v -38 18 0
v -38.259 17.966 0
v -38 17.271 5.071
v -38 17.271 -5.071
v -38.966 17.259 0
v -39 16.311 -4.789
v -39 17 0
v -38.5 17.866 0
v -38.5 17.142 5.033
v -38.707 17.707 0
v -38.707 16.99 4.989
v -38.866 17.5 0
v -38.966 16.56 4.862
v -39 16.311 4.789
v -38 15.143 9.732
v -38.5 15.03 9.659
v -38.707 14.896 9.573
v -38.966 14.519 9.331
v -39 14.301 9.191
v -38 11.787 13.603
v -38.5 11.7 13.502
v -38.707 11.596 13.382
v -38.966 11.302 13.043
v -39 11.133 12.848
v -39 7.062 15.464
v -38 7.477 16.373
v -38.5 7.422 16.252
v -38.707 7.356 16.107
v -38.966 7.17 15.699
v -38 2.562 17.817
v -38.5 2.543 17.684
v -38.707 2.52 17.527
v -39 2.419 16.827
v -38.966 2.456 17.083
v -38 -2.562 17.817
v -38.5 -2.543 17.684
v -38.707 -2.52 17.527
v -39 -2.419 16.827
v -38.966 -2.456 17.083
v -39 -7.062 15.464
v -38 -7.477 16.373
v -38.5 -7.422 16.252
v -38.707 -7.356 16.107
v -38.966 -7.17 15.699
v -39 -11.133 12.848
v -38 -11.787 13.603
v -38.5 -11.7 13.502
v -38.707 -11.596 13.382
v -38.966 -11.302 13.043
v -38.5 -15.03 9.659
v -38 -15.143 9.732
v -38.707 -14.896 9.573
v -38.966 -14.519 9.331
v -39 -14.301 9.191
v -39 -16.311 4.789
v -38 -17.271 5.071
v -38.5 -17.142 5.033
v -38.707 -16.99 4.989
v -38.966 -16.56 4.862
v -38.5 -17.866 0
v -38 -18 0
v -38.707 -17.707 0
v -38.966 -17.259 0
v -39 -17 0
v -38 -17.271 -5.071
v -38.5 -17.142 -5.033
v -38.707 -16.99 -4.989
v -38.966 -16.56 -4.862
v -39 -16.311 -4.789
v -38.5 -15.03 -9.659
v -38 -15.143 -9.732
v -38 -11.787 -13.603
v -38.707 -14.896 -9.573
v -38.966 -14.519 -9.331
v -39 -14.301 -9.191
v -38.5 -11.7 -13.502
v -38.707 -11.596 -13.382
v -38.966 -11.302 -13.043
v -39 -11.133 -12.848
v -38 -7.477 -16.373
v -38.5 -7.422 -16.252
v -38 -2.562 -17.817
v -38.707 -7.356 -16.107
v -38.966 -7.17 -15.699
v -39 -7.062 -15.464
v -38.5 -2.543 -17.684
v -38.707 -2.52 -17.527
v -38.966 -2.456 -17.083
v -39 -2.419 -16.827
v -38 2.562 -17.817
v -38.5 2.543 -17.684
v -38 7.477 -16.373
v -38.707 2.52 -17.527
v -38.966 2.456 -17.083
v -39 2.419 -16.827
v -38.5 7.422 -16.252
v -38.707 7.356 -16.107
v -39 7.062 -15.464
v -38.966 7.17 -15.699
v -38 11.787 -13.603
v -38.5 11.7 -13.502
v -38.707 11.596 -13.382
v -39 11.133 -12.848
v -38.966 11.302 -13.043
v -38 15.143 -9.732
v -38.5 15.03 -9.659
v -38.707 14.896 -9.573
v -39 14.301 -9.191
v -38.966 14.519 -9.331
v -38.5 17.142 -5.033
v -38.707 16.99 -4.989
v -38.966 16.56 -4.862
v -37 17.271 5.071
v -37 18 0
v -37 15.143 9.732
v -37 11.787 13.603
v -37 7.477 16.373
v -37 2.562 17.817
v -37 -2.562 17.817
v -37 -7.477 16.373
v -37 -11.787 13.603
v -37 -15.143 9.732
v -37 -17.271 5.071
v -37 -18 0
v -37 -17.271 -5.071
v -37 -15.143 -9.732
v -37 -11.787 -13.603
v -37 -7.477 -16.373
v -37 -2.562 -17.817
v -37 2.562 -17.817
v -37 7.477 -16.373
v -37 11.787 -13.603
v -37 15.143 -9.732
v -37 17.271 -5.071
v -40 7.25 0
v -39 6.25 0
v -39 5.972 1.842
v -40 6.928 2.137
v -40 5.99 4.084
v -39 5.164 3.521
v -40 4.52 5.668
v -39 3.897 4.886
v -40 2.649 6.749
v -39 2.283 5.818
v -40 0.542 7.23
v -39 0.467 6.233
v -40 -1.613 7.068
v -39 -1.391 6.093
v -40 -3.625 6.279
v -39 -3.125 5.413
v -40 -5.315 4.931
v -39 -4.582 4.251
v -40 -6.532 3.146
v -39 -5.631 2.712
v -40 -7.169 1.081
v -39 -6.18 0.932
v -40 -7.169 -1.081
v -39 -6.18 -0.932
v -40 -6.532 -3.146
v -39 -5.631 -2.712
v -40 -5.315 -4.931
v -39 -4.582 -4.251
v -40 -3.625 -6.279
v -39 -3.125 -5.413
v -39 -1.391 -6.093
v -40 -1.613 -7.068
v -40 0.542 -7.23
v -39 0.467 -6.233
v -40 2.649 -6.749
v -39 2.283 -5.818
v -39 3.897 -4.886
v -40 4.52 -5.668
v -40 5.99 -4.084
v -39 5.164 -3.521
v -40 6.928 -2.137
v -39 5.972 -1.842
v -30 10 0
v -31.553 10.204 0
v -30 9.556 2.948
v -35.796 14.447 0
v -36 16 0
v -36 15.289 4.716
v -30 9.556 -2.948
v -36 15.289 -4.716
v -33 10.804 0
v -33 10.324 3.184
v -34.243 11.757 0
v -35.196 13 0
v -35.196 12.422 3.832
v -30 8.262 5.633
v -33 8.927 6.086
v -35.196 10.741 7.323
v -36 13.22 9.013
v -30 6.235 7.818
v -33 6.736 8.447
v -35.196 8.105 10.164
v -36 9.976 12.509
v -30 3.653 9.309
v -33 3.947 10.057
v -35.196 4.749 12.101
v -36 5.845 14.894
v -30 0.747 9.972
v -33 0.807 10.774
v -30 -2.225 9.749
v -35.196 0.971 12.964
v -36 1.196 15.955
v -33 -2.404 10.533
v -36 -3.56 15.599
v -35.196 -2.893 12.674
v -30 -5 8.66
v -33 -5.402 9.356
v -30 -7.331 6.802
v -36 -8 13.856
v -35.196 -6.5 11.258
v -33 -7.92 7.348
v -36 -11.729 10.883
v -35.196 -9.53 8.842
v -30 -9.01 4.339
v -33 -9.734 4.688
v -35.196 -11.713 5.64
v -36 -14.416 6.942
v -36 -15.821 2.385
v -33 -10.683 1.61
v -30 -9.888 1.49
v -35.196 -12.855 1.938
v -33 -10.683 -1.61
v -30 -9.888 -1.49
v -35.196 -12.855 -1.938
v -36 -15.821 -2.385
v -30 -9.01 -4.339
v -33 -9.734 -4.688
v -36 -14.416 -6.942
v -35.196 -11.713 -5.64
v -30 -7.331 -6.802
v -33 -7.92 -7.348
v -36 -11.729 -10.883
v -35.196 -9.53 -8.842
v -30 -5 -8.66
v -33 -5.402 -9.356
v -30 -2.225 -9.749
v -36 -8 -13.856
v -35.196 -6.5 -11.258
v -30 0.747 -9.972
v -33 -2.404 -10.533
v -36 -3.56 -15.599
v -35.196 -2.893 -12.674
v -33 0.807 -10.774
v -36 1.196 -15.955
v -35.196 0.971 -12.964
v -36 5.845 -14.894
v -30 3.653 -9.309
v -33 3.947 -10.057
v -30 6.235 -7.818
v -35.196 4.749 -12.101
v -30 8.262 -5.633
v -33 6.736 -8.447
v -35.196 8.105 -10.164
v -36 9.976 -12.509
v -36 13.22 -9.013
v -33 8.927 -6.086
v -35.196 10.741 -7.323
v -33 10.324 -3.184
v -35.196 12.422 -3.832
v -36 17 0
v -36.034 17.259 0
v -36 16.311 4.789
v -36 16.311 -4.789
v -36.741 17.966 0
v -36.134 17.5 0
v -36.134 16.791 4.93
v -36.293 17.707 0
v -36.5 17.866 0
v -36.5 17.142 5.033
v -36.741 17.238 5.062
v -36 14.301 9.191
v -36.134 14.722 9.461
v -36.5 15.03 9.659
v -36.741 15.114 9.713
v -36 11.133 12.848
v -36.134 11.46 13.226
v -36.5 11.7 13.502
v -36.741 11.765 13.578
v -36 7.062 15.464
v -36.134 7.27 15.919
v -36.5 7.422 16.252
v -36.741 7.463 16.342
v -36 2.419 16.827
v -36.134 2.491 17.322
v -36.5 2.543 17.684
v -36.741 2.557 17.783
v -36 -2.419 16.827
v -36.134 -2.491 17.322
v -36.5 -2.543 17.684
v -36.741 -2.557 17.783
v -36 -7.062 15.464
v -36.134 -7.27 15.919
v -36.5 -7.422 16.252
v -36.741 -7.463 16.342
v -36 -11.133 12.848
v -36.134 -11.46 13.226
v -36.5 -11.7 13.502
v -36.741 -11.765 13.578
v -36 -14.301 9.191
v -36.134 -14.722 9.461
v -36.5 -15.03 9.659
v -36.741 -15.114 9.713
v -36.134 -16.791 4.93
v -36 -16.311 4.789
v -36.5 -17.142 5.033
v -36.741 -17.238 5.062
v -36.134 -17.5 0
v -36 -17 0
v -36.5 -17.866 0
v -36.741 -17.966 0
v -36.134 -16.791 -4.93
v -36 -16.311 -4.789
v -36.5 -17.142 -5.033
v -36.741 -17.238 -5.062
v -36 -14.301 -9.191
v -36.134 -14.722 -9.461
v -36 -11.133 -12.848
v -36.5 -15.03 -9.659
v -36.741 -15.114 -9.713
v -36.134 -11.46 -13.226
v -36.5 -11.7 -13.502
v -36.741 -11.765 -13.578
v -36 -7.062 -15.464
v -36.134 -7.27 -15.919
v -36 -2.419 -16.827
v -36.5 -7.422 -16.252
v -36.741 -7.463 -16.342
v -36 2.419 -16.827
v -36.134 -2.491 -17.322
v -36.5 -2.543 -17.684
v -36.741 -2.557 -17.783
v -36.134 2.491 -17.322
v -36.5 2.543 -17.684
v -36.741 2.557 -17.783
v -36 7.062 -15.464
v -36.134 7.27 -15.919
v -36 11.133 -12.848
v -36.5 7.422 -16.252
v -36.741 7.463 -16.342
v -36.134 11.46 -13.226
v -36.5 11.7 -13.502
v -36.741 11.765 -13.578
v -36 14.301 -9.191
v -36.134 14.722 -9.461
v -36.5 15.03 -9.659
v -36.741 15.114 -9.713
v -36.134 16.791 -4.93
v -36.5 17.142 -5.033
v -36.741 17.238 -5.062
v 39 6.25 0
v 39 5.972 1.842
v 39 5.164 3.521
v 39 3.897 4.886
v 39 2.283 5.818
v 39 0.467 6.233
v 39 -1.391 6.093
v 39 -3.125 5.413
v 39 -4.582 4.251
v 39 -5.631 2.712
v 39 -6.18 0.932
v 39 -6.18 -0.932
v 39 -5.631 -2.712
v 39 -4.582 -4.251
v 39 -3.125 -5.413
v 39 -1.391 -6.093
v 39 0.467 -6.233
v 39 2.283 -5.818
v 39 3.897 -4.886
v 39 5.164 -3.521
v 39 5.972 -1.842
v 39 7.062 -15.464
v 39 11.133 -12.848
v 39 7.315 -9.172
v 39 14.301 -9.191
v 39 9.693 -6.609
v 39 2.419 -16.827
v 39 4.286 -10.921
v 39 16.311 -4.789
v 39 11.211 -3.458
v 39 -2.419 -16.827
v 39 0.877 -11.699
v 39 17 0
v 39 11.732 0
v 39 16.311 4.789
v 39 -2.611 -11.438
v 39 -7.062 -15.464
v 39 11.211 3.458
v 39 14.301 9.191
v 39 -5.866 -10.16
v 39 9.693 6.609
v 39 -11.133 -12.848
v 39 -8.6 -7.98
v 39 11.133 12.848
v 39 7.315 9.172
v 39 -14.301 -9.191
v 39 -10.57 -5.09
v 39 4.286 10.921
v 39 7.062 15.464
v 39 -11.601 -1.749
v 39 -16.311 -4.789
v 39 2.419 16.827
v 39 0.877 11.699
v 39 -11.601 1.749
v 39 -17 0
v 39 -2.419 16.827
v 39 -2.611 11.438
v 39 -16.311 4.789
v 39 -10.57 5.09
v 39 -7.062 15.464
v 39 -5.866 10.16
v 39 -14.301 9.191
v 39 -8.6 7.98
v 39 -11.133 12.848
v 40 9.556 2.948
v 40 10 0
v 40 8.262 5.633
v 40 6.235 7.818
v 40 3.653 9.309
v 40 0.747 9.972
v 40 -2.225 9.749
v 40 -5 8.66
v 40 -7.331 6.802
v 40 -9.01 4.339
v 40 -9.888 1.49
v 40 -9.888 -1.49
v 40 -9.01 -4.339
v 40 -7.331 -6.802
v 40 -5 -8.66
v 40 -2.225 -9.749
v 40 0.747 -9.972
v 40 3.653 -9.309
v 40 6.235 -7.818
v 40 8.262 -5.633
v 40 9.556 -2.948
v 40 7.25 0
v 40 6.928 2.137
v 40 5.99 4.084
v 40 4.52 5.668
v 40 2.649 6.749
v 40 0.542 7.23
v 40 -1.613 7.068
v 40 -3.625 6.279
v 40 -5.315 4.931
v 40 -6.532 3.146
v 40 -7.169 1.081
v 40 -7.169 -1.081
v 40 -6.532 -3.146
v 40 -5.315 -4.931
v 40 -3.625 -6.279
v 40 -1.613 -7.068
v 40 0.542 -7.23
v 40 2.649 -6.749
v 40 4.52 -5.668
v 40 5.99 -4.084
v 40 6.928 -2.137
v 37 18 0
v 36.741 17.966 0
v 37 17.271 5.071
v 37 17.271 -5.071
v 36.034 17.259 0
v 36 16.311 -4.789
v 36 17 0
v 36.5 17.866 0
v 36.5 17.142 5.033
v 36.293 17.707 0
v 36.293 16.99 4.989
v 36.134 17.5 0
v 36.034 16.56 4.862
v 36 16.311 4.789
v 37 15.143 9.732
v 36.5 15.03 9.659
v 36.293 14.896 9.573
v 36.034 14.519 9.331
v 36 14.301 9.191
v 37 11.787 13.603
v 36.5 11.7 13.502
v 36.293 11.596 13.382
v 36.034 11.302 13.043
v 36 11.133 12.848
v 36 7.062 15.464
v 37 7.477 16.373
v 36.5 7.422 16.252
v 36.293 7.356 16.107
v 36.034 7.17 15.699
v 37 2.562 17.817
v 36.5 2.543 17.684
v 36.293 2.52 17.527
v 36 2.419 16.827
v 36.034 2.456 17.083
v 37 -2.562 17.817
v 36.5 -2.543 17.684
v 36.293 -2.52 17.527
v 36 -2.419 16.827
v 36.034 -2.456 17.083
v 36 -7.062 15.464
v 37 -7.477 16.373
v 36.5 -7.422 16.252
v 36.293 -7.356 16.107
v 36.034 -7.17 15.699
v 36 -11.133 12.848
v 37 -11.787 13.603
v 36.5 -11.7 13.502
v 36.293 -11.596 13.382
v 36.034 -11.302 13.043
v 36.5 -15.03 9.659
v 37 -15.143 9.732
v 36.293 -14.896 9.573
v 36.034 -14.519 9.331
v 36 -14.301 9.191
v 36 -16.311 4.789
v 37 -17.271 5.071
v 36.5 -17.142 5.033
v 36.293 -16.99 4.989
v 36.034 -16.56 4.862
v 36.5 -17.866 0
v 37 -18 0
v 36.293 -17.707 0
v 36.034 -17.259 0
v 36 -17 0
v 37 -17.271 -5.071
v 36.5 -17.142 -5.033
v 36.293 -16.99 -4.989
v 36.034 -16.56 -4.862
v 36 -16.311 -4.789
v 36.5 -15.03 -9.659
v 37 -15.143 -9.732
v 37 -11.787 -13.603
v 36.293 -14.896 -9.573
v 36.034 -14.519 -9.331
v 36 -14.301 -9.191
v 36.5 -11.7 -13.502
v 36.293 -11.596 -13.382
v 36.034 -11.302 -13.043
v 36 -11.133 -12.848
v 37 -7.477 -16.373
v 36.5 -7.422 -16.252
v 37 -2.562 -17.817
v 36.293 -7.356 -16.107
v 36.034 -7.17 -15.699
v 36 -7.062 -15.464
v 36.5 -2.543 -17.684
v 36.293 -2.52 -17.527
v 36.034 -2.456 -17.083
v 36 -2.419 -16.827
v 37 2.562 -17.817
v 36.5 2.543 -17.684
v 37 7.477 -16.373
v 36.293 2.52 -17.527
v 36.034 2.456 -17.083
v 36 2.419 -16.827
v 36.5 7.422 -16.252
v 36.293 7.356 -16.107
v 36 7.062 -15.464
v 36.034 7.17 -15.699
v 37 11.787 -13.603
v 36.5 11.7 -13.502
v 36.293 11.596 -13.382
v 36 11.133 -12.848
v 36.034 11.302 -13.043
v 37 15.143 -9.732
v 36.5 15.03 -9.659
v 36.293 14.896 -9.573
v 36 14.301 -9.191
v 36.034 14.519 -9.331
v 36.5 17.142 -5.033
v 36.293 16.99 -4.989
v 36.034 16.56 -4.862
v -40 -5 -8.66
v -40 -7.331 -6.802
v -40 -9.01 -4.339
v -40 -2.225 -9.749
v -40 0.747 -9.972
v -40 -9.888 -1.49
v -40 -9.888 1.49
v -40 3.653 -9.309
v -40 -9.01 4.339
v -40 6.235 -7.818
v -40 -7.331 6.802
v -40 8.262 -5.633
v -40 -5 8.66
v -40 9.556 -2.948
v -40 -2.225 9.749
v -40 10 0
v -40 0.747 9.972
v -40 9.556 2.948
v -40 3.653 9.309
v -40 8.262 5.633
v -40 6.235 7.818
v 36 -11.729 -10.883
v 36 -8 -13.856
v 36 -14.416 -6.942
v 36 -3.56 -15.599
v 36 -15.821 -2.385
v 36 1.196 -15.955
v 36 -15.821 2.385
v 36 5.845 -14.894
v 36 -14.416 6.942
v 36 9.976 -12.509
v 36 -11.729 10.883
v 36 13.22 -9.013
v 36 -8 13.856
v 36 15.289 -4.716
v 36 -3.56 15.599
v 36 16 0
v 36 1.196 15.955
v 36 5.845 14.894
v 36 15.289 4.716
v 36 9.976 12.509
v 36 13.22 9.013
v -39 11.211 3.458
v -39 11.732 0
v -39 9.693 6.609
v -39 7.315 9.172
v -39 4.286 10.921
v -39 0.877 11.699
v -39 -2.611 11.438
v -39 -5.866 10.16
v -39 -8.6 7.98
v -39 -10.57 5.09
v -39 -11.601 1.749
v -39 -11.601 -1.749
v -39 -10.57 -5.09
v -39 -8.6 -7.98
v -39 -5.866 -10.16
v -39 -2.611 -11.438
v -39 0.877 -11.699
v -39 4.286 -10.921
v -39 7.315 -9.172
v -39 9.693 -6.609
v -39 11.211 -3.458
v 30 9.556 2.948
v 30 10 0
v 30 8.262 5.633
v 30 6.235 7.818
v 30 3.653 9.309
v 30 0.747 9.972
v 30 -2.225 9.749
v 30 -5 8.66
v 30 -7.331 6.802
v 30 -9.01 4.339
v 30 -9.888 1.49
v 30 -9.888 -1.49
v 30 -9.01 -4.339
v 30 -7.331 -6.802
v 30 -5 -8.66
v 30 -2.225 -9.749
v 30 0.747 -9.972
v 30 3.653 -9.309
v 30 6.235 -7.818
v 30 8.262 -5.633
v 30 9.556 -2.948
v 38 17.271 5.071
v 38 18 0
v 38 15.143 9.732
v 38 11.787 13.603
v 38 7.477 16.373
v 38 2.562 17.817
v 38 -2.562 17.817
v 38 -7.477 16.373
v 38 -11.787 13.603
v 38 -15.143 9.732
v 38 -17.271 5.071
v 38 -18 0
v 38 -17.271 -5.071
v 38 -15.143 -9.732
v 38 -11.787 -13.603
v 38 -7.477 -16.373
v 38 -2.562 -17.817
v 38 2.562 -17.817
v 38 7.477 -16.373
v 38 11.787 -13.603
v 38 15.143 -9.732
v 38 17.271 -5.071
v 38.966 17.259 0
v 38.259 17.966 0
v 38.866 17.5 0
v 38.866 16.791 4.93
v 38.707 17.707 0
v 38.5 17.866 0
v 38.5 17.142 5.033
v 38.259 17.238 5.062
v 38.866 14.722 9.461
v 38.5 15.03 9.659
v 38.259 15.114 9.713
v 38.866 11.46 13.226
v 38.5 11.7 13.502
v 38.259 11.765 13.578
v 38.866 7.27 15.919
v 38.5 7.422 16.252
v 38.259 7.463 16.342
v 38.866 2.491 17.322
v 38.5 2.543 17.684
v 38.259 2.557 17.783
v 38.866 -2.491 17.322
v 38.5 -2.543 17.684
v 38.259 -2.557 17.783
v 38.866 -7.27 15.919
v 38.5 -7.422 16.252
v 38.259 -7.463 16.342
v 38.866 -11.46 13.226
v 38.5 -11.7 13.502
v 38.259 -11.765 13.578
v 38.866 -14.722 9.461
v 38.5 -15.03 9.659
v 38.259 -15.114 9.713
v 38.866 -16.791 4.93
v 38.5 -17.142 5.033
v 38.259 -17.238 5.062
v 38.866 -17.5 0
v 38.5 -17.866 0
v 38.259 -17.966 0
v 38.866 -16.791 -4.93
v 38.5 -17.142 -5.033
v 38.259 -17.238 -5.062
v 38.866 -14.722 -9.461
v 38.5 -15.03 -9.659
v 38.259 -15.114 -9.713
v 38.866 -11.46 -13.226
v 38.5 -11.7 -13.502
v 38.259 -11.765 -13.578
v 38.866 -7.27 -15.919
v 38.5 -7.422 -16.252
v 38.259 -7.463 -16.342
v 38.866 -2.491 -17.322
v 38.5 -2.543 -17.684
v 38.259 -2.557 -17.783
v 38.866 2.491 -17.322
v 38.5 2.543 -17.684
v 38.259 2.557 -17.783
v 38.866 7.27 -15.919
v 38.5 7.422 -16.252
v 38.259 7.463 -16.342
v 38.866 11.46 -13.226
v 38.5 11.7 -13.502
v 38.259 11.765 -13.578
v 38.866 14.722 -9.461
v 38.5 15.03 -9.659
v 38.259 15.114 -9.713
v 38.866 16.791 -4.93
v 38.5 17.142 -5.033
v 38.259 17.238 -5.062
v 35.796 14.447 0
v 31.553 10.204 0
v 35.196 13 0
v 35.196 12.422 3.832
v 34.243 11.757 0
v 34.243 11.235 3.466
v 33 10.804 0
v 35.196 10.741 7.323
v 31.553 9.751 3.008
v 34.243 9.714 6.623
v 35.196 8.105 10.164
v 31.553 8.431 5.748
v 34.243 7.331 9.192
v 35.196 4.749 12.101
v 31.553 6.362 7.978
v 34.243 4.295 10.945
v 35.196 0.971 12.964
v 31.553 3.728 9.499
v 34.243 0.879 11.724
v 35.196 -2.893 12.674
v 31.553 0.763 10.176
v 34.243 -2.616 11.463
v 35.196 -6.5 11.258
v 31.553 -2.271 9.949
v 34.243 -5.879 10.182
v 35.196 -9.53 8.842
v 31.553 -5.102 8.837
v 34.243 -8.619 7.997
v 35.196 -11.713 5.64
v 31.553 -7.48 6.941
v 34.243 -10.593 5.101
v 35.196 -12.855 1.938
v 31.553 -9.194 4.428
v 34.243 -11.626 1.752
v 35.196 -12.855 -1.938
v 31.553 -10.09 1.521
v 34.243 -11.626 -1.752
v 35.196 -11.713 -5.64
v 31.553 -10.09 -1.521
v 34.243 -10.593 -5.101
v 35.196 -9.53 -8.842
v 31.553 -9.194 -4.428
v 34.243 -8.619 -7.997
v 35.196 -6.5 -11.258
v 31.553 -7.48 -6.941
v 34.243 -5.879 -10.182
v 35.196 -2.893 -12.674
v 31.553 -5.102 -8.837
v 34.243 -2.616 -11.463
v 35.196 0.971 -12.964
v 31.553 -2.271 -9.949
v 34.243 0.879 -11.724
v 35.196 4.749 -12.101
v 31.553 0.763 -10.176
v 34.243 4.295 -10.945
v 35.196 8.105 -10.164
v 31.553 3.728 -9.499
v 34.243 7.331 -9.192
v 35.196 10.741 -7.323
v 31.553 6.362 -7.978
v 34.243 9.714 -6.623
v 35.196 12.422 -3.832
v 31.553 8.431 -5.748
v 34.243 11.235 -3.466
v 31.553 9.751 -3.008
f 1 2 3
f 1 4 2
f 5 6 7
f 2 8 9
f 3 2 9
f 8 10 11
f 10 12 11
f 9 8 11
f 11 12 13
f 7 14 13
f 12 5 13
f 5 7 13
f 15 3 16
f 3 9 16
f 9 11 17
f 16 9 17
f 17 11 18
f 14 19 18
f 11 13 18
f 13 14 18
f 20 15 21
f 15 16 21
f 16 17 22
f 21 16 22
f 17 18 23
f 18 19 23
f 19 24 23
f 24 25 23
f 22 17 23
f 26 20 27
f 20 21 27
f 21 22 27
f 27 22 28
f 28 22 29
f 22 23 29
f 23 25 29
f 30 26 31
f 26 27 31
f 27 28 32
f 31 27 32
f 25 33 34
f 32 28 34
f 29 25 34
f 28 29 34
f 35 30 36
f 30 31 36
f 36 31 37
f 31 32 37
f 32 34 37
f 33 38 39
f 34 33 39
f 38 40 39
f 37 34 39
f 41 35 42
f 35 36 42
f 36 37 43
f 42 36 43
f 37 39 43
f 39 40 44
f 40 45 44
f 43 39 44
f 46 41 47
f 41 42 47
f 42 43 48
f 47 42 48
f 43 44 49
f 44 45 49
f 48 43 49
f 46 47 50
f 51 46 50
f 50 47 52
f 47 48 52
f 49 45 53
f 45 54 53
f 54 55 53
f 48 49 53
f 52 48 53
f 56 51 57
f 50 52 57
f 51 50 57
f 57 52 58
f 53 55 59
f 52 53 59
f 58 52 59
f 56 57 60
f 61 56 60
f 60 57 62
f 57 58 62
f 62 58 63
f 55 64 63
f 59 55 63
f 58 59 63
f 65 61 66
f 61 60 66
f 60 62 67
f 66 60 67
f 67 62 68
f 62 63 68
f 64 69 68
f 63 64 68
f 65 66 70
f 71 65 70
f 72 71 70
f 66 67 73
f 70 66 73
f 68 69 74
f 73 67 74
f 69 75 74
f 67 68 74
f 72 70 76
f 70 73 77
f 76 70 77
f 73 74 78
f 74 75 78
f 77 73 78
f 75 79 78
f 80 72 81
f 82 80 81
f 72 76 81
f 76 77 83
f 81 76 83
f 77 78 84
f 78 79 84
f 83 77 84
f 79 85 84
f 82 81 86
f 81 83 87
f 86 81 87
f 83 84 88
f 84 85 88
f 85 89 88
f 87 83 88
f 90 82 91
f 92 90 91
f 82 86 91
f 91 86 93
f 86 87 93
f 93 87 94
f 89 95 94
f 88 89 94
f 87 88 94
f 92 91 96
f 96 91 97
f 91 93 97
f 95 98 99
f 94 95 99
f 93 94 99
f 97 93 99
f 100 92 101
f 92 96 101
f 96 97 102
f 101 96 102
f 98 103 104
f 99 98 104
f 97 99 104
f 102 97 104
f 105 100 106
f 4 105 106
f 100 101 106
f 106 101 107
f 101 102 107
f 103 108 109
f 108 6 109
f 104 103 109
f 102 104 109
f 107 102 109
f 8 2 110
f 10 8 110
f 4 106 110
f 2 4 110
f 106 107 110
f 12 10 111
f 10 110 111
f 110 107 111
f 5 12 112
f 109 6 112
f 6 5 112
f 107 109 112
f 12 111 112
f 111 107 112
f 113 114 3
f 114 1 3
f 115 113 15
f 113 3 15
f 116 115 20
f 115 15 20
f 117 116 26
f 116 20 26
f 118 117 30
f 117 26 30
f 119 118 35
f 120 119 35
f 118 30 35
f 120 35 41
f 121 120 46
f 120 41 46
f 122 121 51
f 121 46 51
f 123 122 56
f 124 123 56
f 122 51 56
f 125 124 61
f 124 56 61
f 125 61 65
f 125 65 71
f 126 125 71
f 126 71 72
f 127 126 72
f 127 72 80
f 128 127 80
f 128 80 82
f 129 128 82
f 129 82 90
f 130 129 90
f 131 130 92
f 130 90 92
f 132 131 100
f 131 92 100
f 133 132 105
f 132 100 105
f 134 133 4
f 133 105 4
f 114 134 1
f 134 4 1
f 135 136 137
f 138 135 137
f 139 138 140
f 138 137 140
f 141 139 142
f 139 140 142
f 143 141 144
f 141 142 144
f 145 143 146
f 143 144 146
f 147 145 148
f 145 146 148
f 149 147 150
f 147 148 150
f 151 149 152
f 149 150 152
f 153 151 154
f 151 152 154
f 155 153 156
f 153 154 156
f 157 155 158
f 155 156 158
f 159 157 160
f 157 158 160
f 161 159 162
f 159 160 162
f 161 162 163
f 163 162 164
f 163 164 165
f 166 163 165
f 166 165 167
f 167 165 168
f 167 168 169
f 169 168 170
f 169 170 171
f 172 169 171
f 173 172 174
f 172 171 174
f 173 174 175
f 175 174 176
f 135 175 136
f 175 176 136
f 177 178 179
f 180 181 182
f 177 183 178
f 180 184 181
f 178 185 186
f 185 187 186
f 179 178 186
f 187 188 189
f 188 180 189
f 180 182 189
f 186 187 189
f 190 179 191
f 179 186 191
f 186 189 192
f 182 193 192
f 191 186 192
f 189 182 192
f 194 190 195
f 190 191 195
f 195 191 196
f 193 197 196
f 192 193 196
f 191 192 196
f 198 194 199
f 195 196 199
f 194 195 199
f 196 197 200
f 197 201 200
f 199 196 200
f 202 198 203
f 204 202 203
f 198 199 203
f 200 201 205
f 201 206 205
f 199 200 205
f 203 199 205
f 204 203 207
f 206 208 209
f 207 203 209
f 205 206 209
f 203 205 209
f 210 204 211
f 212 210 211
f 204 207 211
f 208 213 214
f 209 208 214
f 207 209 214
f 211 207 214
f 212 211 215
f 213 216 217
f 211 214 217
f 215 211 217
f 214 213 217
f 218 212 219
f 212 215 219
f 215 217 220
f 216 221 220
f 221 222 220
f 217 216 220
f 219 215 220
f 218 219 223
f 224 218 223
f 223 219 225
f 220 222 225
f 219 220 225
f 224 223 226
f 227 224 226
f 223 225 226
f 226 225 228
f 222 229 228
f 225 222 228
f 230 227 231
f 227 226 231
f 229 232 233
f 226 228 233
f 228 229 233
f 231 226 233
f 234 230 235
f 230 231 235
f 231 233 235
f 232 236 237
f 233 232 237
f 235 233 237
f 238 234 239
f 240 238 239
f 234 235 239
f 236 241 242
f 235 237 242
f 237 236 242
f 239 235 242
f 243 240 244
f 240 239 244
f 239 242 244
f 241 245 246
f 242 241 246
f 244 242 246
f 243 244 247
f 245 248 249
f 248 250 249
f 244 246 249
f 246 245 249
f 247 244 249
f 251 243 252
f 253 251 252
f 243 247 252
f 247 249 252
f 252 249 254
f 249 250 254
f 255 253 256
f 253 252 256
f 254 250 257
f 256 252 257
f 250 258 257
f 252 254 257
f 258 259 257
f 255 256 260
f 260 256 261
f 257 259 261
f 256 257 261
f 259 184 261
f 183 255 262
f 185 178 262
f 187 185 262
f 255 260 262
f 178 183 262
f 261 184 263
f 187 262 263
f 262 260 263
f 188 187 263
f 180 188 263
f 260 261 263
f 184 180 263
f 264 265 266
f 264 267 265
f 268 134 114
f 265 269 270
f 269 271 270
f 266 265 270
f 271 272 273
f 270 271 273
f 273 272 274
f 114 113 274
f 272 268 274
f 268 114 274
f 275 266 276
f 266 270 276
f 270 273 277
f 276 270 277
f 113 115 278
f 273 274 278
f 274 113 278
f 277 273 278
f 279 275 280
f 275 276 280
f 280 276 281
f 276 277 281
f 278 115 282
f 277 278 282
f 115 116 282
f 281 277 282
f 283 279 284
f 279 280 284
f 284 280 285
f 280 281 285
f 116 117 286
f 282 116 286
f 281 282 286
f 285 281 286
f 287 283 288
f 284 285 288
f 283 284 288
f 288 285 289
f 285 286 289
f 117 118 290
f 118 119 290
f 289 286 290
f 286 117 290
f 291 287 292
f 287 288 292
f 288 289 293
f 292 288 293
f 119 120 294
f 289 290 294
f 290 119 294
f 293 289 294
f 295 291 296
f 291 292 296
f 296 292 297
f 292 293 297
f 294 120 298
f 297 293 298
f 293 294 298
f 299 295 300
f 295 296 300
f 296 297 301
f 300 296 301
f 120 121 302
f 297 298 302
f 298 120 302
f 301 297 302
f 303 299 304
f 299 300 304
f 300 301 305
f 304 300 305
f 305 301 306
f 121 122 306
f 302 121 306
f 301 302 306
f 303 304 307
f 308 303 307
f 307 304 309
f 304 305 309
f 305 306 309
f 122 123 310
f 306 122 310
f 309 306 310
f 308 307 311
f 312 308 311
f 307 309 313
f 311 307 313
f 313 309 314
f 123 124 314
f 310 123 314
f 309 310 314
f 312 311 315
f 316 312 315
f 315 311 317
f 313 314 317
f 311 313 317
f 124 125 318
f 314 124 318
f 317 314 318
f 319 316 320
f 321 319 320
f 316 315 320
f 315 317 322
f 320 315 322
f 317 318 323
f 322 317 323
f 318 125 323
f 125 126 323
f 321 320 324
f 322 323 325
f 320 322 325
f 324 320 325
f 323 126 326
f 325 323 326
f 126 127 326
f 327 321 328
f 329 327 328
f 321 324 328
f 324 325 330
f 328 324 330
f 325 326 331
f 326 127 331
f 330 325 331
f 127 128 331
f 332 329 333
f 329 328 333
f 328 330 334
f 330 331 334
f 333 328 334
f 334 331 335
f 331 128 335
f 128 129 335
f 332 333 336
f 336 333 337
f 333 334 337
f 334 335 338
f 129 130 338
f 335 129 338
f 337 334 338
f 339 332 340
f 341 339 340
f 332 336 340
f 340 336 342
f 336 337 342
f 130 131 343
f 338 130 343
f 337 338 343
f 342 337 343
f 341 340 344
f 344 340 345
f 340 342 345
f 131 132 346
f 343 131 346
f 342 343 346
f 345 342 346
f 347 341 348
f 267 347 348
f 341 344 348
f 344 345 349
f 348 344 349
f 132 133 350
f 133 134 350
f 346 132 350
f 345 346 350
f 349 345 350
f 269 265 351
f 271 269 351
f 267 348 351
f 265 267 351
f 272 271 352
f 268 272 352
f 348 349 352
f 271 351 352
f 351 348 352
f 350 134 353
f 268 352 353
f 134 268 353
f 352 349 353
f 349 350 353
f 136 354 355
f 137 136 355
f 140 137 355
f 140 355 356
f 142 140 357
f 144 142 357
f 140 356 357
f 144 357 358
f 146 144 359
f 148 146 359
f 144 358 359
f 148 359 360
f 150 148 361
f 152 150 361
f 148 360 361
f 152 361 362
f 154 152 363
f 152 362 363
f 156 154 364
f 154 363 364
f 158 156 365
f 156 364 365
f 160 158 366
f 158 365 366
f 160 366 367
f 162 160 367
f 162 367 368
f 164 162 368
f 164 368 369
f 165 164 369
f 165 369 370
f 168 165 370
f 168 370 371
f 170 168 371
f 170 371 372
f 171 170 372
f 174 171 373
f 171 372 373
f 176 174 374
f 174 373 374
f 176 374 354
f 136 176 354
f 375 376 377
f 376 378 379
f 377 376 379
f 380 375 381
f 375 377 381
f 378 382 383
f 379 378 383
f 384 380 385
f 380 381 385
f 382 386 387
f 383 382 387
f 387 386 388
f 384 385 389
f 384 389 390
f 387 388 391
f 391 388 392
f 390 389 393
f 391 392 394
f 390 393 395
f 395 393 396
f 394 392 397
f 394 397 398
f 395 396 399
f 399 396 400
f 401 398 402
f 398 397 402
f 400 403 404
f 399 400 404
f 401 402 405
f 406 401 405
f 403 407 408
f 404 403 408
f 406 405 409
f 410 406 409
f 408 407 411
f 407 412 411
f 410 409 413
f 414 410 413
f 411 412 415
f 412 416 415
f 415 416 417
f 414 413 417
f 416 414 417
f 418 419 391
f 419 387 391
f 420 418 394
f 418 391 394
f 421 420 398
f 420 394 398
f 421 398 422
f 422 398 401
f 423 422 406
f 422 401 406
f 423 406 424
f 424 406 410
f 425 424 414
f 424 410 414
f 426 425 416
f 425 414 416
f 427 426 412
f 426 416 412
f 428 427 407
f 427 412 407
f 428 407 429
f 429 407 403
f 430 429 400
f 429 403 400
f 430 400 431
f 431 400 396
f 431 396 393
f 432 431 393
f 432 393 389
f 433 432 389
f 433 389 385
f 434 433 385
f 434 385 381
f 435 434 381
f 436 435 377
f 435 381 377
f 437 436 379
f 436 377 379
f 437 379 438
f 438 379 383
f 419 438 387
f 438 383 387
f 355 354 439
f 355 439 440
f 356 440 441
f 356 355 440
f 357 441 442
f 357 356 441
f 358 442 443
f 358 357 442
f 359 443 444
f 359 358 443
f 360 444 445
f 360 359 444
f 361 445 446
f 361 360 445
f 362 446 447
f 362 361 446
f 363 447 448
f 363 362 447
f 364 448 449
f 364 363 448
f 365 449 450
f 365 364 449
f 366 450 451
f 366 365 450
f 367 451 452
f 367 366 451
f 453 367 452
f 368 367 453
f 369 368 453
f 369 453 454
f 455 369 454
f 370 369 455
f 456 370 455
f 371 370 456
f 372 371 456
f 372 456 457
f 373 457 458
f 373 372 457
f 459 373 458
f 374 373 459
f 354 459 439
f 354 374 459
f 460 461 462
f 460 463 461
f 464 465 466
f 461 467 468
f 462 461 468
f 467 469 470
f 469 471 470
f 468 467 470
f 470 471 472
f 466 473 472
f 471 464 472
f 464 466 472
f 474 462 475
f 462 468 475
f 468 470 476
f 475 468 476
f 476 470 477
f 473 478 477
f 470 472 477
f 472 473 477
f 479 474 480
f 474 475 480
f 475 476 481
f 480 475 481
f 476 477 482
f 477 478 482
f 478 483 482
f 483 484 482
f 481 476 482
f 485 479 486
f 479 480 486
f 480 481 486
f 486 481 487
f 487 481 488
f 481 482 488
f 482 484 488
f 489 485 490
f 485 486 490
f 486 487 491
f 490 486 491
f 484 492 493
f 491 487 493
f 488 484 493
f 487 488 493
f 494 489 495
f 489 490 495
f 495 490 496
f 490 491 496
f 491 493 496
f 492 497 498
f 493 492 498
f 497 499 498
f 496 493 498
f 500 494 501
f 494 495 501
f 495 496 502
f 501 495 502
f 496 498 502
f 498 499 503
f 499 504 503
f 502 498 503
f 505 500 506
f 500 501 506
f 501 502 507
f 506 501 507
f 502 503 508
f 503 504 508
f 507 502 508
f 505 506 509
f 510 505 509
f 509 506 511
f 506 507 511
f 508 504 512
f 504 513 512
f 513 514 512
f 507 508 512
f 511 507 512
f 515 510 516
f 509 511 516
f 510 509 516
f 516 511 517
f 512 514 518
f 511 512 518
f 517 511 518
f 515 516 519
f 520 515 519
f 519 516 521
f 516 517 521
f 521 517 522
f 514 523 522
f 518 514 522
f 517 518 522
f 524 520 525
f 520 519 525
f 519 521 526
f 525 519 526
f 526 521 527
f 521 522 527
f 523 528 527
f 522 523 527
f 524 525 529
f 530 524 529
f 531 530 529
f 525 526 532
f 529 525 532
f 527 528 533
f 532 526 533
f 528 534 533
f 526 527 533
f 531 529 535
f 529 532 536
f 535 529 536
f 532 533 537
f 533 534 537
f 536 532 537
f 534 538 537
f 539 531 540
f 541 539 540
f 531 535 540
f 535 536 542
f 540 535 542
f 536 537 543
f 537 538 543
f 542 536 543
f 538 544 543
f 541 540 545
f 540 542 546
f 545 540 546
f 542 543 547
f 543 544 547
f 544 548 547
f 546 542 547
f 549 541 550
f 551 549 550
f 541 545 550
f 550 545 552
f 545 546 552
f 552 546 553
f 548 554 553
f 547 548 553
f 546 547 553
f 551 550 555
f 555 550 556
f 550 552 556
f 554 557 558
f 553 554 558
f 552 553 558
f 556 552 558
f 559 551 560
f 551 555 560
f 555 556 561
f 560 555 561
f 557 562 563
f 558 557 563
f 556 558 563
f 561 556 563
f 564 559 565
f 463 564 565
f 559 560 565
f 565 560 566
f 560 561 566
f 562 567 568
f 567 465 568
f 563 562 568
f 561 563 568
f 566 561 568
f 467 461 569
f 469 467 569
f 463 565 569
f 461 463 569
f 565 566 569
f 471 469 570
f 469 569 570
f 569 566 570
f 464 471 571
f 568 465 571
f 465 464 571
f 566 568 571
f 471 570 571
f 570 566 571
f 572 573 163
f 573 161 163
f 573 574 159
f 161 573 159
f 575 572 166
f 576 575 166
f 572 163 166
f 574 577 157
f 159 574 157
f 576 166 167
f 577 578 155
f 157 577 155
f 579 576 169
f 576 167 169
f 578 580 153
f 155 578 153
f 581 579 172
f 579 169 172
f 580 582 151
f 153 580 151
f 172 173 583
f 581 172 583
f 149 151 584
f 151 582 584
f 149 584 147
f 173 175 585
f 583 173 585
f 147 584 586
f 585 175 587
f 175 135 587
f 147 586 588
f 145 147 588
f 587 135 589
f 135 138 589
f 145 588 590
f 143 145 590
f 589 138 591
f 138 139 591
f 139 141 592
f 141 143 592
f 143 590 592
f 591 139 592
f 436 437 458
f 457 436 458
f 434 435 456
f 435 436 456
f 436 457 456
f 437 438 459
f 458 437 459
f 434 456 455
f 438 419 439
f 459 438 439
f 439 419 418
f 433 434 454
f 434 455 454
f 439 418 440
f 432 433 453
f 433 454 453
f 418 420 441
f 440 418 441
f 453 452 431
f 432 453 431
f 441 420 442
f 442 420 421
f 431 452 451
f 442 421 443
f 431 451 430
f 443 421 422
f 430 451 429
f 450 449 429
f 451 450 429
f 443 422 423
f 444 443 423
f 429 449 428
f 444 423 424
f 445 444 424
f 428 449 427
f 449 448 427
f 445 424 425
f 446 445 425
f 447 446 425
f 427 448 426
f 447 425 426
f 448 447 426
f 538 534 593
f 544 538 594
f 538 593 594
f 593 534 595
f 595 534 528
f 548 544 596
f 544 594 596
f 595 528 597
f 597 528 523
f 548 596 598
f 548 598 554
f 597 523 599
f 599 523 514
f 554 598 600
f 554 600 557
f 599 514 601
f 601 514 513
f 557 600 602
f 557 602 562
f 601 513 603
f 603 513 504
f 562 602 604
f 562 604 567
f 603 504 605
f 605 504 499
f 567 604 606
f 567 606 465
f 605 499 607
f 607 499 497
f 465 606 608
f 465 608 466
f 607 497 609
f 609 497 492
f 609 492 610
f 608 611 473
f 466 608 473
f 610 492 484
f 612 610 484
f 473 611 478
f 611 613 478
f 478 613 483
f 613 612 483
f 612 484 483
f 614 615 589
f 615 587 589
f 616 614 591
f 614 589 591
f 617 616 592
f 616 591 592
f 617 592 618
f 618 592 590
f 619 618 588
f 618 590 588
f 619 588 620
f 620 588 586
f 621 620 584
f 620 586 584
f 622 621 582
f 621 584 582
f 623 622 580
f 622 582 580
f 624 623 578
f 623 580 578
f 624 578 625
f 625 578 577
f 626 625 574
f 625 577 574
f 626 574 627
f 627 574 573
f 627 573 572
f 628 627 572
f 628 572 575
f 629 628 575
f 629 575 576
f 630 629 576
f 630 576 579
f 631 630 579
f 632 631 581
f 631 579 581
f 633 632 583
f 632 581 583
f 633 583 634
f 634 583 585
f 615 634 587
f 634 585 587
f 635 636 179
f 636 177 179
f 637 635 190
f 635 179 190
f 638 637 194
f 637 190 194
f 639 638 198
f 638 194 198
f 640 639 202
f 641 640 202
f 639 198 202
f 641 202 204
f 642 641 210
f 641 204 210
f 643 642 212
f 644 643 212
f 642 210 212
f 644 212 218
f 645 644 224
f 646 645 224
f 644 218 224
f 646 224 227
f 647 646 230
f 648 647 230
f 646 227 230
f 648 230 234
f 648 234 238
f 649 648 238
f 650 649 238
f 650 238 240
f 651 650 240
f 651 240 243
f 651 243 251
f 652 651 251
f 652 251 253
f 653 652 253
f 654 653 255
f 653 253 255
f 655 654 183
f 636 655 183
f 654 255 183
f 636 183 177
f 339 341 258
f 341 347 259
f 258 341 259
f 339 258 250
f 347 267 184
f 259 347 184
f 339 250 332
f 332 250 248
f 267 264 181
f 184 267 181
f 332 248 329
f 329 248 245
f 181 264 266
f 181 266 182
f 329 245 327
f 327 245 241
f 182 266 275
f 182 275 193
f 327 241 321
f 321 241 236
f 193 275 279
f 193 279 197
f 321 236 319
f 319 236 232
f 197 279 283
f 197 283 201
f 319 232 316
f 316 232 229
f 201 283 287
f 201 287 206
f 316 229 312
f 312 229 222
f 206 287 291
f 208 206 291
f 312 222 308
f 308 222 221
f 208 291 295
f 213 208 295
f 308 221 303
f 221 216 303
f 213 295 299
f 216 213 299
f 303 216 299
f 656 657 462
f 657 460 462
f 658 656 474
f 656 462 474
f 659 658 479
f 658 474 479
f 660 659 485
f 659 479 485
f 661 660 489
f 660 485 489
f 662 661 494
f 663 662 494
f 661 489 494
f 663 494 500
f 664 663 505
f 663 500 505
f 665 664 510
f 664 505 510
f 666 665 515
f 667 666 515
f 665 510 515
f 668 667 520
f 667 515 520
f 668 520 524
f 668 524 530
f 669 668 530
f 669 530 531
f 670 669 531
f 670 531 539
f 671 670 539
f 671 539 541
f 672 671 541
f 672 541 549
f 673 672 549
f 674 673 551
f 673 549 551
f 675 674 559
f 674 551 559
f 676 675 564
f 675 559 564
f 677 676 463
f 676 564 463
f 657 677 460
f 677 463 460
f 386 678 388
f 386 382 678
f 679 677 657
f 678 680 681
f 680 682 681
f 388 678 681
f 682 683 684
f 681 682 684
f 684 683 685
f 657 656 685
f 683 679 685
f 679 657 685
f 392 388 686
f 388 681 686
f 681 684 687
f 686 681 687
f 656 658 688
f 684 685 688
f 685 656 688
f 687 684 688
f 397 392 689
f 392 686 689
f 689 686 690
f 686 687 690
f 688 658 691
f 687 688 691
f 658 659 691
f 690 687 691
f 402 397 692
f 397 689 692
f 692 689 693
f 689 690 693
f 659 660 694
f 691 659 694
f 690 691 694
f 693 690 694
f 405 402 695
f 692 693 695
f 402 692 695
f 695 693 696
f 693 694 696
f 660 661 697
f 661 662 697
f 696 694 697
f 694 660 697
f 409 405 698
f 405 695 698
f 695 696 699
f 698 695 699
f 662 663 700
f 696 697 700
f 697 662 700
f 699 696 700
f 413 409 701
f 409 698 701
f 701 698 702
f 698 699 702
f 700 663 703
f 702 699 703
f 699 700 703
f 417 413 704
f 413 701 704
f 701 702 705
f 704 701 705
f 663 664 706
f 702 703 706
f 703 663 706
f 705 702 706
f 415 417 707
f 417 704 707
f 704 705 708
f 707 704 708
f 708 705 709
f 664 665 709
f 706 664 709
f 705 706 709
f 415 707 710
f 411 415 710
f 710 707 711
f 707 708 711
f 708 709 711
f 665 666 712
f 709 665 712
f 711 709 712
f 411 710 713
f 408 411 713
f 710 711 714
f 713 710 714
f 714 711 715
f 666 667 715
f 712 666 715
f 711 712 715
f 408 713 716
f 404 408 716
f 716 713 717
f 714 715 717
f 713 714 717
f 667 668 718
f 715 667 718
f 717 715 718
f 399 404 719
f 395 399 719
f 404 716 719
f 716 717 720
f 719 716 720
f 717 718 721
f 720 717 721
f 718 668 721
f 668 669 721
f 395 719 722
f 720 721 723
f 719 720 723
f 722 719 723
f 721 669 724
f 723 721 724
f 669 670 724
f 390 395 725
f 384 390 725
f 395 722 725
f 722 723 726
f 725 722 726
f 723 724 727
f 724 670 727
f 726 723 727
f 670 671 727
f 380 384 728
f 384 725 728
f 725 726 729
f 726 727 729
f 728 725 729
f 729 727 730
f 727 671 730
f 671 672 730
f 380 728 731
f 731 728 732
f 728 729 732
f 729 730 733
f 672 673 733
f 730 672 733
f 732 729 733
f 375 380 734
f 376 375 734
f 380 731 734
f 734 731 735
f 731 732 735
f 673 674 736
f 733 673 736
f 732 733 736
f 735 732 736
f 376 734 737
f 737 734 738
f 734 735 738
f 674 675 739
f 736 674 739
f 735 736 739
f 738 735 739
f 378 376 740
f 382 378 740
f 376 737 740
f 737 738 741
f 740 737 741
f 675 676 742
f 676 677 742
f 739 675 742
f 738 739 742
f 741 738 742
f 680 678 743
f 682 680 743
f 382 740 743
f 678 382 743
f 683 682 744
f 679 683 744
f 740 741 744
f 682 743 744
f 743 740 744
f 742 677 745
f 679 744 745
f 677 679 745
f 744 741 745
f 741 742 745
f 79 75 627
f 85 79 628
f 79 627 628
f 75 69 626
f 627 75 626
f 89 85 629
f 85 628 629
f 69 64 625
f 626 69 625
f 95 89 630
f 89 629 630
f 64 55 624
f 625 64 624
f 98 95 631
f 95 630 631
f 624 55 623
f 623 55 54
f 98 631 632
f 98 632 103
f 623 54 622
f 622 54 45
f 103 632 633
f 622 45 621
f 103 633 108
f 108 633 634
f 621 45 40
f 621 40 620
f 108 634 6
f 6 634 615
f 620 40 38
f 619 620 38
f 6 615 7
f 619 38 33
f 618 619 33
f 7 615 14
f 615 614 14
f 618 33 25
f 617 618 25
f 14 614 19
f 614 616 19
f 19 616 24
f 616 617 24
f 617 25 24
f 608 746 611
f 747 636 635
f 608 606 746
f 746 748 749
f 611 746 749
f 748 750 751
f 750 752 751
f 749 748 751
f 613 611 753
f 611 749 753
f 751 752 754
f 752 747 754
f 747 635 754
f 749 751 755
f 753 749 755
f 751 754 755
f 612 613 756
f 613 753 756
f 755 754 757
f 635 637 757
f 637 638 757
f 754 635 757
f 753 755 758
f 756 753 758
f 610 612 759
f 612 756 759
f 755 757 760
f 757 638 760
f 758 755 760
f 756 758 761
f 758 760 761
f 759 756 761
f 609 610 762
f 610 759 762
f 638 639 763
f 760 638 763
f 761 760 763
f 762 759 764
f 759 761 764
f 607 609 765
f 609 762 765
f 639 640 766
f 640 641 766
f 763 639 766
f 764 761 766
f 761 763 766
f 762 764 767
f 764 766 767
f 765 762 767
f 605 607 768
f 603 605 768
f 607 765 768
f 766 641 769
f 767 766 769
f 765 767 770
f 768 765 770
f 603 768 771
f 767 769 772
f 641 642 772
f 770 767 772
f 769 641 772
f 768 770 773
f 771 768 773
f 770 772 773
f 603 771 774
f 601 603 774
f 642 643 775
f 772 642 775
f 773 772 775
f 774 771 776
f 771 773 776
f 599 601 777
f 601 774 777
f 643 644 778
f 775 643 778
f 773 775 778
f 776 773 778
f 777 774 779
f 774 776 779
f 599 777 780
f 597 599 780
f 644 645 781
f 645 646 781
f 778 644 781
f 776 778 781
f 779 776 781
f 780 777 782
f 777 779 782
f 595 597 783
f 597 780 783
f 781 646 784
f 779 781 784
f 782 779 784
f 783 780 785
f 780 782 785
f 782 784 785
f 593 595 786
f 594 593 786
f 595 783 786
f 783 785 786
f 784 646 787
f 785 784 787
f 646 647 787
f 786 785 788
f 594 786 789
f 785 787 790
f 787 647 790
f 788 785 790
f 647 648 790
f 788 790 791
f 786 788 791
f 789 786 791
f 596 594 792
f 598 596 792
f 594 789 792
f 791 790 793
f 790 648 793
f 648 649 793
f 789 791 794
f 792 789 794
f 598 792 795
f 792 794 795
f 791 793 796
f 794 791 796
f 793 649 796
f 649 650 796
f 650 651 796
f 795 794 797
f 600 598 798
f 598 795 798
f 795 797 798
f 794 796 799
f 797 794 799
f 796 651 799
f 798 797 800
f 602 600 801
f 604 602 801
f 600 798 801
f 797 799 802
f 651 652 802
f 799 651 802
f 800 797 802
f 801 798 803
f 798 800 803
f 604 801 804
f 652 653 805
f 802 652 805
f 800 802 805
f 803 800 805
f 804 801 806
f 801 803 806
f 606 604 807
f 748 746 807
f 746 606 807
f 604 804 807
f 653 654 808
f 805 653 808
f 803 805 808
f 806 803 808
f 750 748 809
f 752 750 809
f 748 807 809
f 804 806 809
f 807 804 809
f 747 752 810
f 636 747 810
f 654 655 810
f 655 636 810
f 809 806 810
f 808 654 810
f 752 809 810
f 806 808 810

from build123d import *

# Parameters (mm, degrees)
KANTREIFNING1_SIZE = 1


with BuildPart() as part:
    # Sketch1 → Revolve1 (revolve)
    with BuildSketch(Plane.XY):
        with BuildLine():
            Line((40, 6.25), (40, 10))
            Line((40, 10), (39, 11.732050808))
            Line((39, 11.732050808), (39, 17))
            ThreePointArc((39, 17), (38.707106781, 17.707106781), (38, 18))
            Line((38, 18), (37, 18))
            ThreePointArc((37, 18), (36.292893219, 17.707106781), (36, 17))
            Line((36, 17), (36, 16))
            ThreePointArc((36, 16), (34.242640687, 11.757359313), (30, 10))
            Line((30, 10), (-30, 10))
            ThreePointArc((-30, 10), (-34.242640687, 11.757359313), (-36, 16))
            Line((-36, 16), (-36, 17))
            ThreePointArc((-36, 17), (-36.292893219, 17.707106781), (-37, 18))
            Line((-37, 18), (-38, 18))
            ThreePointArc((-38, 18), (-38.707106781, 17.707106781), (-39, 17))
            Line((-39, 17), (-39, 11.732050808))
            Line((-39, 11.732050808), (-40, 10))
            Line((-40, 10), (-40, 6.25))
            Line((-40, 6.25), (40, 6.25))
        make_face()
    revolve(axis=Axis((0, 0, 0), (1, 0, 0)))

    # Kantreifning1
    kantreifning1_edges = [part.edges().sort_by_distance(p)[0] for p in [
        (40, -6.25, 0),
        (-40, -6.25, 0),
    ]]
    chamfer(kantreifning1_edges, length=KANTREIFNING1_SIZE)


solid = part.part
